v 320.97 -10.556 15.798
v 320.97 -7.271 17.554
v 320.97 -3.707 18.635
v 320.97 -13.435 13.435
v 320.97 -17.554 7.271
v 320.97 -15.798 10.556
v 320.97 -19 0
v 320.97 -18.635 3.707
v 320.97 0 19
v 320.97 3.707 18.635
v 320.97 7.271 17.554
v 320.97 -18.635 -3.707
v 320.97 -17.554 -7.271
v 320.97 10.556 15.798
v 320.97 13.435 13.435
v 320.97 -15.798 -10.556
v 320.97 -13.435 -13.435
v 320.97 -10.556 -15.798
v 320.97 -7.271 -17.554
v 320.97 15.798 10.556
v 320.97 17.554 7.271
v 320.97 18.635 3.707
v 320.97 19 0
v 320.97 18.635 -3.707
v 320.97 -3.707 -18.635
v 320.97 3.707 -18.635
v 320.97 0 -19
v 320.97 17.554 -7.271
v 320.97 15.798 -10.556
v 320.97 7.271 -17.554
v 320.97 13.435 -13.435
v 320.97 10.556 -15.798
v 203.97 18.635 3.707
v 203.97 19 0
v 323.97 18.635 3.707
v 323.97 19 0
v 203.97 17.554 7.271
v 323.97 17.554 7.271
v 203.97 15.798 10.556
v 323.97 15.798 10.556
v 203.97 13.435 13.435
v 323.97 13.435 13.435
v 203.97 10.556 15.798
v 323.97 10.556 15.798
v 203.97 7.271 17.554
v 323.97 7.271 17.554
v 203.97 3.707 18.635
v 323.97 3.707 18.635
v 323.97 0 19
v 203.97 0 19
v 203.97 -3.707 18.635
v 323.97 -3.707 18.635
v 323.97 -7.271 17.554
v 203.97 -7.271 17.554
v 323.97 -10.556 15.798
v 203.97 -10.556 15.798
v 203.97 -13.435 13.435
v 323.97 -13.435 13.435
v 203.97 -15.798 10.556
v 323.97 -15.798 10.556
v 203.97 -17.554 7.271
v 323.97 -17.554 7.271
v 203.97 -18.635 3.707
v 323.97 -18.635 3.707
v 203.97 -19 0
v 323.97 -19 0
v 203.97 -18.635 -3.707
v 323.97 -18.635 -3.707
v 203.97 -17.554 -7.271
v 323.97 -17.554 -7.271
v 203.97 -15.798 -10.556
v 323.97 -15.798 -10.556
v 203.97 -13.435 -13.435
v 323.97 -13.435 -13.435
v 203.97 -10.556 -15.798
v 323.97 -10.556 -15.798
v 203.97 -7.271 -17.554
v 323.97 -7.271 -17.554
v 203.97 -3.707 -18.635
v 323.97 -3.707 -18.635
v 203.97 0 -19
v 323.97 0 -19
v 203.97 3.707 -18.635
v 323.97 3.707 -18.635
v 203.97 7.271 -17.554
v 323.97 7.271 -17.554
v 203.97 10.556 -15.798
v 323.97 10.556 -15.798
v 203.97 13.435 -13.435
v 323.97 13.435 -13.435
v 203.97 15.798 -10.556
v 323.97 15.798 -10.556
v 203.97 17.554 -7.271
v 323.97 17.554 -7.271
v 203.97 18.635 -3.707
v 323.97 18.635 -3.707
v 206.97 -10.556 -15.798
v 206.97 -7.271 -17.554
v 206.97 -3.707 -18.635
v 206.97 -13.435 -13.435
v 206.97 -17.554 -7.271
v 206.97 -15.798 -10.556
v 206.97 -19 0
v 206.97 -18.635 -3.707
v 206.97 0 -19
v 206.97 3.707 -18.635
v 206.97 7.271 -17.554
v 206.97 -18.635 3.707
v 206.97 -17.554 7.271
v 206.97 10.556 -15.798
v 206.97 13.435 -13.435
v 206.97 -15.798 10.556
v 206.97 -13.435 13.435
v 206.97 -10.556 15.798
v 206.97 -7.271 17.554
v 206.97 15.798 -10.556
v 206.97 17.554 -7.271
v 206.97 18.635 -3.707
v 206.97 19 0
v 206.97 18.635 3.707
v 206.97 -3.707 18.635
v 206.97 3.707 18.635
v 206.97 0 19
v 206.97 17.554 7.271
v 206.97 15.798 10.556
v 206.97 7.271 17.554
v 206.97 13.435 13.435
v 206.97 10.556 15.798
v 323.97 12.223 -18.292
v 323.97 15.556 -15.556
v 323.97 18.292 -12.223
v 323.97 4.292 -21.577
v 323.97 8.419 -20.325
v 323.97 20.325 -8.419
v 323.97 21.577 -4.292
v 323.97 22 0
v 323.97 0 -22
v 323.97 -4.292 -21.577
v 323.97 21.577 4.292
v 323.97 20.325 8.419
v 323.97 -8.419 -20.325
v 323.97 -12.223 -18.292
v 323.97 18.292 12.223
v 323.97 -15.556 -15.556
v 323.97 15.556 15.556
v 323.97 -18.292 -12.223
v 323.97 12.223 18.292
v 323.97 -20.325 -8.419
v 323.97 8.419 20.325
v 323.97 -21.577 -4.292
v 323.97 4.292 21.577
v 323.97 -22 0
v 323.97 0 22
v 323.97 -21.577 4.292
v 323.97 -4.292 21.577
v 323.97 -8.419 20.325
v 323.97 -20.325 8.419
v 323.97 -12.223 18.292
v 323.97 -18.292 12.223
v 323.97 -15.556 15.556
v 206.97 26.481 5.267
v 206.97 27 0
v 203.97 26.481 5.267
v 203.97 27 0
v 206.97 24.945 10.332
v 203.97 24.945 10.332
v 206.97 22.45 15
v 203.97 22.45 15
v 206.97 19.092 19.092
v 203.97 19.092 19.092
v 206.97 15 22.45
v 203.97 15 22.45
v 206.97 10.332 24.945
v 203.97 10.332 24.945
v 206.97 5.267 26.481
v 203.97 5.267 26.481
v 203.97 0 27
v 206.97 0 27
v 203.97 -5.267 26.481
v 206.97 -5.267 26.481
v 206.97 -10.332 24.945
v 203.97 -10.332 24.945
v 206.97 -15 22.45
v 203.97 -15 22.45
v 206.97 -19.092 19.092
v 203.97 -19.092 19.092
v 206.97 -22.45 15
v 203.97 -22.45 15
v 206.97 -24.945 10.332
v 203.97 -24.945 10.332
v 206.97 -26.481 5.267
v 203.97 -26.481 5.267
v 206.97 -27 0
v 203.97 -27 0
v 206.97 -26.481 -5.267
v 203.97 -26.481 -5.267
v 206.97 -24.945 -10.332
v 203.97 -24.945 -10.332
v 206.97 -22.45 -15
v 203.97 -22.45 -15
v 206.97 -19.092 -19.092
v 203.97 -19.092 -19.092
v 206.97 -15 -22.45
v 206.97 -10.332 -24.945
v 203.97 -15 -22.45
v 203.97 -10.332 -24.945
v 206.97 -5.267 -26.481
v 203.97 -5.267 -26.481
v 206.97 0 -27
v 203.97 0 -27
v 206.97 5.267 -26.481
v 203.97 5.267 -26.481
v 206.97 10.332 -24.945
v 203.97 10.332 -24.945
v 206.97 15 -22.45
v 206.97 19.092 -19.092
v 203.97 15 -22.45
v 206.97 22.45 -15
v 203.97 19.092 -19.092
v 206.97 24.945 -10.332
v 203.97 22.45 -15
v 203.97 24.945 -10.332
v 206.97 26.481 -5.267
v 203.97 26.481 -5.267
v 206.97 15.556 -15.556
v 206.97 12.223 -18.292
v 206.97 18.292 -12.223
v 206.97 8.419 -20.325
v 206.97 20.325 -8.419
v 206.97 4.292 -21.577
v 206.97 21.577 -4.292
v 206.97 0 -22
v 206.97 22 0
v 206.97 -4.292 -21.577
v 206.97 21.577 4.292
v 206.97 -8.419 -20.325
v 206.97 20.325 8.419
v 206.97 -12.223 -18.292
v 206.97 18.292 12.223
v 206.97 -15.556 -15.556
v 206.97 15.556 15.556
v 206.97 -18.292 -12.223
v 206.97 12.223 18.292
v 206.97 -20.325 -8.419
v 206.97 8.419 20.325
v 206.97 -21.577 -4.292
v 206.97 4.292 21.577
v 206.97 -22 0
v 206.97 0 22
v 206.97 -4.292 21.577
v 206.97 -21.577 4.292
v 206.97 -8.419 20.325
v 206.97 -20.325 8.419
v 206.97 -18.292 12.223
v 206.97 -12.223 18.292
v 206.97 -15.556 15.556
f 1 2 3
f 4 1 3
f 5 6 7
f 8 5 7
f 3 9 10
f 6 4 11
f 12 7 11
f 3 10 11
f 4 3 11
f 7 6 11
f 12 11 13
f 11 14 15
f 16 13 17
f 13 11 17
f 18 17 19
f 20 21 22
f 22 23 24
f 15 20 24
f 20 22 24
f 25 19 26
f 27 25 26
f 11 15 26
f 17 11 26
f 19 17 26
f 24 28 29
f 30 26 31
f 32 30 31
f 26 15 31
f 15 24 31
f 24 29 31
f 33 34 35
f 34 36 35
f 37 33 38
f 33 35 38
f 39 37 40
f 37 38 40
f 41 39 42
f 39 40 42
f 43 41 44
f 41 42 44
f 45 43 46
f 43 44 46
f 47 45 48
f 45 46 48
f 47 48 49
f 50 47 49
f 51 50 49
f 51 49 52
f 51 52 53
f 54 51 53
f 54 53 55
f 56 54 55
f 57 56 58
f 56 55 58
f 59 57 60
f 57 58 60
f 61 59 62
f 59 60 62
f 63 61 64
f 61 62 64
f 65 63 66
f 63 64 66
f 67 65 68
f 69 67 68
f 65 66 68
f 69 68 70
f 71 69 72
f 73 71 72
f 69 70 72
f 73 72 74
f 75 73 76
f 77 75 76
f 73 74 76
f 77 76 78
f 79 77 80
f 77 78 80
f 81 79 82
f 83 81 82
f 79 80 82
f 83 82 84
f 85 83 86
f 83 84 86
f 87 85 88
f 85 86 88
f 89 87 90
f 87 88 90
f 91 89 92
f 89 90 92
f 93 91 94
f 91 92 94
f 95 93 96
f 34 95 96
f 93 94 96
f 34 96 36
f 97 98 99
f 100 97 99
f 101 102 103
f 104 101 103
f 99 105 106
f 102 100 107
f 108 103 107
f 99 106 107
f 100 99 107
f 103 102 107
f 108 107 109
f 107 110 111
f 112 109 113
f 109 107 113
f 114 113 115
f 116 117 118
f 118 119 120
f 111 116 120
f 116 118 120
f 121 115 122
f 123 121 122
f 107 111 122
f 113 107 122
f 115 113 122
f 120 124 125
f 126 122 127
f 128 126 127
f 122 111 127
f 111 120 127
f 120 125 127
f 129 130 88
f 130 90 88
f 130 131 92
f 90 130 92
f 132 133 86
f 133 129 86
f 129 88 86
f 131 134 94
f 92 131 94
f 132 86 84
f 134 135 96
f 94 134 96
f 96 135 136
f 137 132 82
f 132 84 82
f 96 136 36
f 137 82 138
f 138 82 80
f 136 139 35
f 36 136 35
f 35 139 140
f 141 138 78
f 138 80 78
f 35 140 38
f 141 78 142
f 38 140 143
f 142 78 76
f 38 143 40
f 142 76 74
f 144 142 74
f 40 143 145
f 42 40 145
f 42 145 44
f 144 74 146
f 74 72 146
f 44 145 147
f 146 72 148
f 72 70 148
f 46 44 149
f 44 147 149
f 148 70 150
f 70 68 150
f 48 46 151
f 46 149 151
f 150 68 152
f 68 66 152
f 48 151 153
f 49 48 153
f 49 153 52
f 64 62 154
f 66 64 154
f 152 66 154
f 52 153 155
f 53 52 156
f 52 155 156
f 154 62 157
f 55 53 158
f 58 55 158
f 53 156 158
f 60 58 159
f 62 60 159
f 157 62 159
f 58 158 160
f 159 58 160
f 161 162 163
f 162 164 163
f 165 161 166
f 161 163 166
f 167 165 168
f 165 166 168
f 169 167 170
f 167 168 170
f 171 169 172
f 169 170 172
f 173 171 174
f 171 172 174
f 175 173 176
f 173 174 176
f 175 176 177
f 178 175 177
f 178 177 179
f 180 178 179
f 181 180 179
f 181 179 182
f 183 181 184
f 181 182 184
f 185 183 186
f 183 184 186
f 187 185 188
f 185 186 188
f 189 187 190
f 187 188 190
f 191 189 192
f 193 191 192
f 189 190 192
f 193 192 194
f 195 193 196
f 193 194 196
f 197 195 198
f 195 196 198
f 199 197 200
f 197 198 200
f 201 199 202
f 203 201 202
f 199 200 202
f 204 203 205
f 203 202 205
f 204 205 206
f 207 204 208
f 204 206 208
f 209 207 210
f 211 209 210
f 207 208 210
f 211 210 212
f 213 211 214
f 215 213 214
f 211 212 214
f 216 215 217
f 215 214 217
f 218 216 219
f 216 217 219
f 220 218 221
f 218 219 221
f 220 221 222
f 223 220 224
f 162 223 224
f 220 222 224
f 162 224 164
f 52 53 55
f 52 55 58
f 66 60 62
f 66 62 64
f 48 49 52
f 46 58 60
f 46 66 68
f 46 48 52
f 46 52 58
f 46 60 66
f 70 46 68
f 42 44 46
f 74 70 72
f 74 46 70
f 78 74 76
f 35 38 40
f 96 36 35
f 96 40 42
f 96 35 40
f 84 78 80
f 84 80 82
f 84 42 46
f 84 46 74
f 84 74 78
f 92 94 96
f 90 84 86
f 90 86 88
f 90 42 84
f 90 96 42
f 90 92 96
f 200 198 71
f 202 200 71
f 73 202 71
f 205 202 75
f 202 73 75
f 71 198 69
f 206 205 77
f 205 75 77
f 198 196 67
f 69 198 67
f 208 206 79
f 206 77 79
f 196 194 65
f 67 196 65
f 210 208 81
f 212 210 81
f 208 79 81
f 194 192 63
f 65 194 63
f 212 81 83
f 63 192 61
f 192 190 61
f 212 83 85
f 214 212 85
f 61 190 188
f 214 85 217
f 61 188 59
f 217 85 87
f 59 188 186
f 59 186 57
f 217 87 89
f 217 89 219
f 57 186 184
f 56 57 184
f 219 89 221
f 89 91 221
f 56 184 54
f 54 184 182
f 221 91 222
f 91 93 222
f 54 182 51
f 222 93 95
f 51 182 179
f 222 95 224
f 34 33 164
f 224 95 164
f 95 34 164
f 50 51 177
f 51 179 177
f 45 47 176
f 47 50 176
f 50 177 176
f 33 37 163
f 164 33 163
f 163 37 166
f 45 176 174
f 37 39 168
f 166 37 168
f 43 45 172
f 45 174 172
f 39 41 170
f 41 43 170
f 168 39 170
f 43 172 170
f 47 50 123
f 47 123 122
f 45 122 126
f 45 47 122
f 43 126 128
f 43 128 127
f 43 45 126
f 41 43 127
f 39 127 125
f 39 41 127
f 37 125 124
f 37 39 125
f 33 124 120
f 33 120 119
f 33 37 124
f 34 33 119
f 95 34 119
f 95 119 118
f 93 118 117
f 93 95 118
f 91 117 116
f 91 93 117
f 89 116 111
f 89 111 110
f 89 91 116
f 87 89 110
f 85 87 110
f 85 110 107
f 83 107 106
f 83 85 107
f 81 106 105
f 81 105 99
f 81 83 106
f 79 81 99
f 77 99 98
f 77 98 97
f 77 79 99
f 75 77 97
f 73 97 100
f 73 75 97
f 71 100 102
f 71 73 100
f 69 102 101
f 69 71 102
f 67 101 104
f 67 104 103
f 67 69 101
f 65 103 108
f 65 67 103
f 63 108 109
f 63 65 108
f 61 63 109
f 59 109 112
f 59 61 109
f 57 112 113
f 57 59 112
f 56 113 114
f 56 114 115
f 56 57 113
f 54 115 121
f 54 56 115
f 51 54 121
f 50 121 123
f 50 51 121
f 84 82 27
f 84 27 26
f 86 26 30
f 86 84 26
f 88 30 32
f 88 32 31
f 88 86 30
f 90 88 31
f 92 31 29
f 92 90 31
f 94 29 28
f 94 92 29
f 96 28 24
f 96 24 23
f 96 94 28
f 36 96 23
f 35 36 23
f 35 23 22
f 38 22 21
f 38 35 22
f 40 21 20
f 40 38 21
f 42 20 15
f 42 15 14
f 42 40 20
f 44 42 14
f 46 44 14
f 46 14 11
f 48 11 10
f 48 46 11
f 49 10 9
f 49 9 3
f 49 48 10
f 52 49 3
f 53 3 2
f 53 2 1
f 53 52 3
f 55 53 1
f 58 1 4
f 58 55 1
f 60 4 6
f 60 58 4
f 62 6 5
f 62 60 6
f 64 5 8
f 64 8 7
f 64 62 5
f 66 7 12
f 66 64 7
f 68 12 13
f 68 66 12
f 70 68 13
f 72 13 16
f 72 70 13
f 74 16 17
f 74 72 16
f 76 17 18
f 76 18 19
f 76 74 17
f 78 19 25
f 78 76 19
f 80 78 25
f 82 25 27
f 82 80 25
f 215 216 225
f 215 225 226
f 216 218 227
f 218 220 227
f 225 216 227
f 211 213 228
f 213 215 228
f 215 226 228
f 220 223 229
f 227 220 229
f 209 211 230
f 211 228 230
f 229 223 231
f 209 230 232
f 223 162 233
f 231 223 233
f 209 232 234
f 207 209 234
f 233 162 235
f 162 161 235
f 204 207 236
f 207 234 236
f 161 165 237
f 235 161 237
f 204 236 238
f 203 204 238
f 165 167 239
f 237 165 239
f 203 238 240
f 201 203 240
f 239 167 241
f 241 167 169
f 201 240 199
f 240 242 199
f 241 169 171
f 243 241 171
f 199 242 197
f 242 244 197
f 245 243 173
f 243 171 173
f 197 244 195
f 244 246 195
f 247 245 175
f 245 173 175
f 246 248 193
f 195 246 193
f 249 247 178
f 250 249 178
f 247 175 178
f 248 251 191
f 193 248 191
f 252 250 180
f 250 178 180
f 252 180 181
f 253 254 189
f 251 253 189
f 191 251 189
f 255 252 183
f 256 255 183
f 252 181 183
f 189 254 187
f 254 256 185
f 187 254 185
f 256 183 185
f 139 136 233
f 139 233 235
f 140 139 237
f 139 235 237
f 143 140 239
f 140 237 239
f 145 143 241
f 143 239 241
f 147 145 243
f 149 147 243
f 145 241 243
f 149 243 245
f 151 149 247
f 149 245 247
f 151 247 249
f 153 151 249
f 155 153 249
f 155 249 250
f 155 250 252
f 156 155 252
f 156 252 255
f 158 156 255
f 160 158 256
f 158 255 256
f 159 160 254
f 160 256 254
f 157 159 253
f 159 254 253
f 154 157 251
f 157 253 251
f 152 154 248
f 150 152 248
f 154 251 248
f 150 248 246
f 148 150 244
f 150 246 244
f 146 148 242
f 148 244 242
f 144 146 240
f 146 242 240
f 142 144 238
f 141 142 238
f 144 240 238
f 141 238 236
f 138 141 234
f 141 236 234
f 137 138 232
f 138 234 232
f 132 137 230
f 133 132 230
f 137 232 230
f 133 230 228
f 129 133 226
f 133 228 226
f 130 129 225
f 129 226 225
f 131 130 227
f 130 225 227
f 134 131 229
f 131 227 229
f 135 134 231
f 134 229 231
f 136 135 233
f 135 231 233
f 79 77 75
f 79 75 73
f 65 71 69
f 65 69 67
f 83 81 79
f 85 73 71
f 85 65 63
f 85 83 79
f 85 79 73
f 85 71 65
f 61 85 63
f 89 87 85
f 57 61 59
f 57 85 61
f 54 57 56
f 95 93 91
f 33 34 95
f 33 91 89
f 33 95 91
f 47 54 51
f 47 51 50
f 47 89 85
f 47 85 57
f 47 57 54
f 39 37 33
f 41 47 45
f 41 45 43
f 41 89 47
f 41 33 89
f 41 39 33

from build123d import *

# Parameters (mm, degrees)
SKETCH2_R           = 19
BOSS_EXTRUDE1_DEPTH = 3
SKETCH3_R           = 19
BOSS_EXTRUDE2_DEPTH = 3


with BuildPart() as part:
    # Sketch1 → Revolve-Thin1 (revolve)
    with BuildSketch(Plane.XY):
        Polygon((203.969675214, 27), (203.969675214, 19), (323.969675214, 19), (323.969675214, 22), (206.969675214, 22), (206.969675214, 27), align=None)
    revolve(axis=Axis((194, 0, 0), (1, 0, 0)))


with BuildPart() as body_2:
    # Sketch2 → Boss-Extrude1 (new body)
    with BuildSketch(Plane.ZY.offset(-203.969675214)):
        Circle(SKETCH2_R)
    extrude(amount=-BOSS_EXTRUDE1_DEPTH)


with BuildPart() as body_3:
    # Sketch3 → Boss-Extrude2 (new body)
    with BuildSketch(Plane(origin=(323.969675214, 0, 0), x_dir=(0, 0, -1), z_dir=(1, 0, 0))):
        Circle(SKETCH3_R)
    extrude(amount=-BOSS_EXTRUDE2_DEPTH)


solid = Compound([part.part, body_2.part, body_3.part])
